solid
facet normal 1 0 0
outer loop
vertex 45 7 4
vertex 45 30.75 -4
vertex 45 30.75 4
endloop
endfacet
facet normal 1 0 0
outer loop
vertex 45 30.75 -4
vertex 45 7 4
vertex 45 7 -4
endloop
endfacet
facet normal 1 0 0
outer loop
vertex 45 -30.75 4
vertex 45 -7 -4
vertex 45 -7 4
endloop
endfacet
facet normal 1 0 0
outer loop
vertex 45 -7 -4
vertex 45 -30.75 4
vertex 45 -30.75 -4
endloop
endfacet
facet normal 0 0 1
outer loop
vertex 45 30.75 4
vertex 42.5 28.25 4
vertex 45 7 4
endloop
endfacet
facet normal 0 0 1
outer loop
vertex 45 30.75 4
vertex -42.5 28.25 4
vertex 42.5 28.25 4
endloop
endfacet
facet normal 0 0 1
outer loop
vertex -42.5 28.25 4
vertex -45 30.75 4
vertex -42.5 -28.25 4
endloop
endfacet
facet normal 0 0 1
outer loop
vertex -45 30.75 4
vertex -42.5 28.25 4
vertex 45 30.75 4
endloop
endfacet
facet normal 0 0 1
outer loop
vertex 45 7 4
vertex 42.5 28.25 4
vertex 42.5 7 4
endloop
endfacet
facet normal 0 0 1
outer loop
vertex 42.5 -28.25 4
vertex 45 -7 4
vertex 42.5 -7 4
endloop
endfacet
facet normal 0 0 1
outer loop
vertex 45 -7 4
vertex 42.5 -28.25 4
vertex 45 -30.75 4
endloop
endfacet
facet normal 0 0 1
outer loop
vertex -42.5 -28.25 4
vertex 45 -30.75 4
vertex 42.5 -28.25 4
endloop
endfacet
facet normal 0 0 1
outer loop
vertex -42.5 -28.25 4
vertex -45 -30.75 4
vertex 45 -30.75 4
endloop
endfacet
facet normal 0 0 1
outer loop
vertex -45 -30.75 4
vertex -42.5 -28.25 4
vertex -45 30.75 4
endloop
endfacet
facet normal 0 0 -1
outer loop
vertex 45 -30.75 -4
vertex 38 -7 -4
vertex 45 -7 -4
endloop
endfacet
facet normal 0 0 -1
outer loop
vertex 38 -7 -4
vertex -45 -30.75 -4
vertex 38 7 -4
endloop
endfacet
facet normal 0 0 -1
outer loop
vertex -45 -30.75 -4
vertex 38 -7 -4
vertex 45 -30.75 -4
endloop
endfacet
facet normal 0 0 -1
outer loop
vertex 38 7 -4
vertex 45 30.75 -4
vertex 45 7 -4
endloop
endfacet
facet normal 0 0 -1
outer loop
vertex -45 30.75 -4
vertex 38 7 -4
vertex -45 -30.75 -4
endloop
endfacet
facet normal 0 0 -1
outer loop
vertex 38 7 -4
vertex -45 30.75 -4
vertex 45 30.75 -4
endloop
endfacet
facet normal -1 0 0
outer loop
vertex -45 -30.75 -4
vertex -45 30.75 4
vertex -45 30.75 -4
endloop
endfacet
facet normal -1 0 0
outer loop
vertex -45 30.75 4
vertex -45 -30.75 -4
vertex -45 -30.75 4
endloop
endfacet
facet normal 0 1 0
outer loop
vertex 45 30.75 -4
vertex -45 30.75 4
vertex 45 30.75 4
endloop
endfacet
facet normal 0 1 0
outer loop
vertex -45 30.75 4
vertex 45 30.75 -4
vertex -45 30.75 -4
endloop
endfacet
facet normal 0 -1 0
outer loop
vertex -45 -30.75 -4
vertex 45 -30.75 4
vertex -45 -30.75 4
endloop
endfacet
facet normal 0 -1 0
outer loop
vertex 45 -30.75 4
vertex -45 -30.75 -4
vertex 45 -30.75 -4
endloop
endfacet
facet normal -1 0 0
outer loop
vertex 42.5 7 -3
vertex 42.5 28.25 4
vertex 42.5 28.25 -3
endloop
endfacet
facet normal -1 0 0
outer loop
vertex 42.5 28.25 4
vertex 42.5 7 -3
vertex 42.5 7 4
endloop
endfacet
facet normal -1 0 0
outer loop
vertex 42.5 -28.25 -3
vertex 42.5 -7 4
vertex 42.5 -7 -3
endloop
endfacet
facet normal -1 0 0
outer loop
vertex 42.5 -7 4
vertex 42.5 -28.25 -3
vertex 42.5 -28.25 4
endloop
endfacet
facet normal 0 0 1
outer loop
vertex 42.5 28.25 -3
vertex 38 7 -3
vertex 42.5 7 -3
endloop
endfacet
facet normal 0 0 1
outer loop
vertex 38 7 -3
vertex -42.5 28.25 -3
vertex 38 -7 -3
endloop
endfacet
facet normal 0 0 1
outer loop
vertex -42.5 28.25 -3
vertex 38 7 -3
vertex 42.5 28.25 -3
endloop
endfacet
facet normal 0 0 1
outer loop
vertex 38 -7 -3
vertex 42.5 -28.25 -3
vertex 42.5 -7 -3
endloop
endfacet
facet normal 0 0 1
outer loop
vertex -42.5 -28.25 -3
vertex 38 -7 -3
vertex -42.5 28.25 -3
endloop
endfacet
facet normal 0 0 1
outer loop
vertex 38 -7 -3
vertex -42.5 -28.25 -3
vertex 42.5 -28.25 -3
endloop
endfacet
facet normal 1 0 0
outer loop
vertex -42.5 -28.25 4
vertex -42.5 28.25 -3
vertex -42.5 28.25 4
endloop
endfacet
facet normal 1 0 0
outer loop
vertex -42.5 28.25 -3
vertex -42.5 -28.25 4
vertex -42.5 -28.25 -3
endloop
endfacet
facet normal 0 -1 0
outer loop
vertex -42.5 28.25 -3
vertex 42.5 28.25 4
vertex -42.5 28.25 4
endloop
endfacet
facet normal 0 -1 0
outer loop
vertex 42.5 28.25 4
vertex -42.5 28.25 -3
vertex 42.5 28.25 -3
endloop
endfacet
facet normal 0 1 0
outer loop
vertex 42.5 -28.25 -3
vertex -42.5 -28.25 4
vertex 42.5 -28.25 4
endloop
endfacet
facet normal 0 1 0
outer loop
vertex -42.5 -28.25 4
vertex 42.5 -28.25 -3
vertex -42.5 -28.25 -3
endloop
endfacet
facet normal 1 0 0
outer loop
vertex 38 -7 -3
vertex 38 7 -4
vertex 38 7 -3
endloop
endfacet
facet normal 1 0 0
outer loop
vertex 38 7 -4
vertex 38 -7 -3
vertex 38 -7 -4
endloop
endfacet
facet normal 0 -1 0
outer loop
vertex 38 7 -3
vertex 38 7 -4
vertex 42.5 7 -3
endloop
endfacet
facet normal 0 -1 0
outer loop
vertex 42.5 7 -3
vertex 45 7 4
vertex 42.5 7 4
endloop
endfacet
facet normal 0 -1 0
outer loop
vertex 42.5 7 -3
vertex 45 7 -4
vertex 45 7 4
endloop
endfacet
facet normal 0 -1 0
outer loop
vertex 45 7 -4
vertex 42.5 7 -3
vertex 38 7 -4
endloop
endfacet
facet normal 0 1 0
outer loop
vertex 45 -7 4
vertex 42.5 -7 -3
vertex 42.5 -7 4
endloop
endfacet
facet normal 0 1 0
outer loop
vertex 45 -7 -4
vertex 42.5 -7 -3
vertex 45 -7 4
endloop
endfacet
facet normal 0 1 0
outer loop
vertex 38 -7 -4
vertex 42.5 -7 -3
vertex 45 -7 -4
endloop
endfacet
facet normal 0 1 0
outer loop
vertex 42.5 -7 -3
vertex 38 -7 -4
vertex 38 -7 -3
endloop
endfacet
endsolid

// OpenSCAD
difference() {
  cube([90, 61.5, 8],center=true);

  translate([ 0, 0, 1]) {
    cube([85, 56.5, 8], center=true);
  }

  translate([ 47, 0, 0]) {
    cube([ 18, 14, 10], center=true);
  }
}
